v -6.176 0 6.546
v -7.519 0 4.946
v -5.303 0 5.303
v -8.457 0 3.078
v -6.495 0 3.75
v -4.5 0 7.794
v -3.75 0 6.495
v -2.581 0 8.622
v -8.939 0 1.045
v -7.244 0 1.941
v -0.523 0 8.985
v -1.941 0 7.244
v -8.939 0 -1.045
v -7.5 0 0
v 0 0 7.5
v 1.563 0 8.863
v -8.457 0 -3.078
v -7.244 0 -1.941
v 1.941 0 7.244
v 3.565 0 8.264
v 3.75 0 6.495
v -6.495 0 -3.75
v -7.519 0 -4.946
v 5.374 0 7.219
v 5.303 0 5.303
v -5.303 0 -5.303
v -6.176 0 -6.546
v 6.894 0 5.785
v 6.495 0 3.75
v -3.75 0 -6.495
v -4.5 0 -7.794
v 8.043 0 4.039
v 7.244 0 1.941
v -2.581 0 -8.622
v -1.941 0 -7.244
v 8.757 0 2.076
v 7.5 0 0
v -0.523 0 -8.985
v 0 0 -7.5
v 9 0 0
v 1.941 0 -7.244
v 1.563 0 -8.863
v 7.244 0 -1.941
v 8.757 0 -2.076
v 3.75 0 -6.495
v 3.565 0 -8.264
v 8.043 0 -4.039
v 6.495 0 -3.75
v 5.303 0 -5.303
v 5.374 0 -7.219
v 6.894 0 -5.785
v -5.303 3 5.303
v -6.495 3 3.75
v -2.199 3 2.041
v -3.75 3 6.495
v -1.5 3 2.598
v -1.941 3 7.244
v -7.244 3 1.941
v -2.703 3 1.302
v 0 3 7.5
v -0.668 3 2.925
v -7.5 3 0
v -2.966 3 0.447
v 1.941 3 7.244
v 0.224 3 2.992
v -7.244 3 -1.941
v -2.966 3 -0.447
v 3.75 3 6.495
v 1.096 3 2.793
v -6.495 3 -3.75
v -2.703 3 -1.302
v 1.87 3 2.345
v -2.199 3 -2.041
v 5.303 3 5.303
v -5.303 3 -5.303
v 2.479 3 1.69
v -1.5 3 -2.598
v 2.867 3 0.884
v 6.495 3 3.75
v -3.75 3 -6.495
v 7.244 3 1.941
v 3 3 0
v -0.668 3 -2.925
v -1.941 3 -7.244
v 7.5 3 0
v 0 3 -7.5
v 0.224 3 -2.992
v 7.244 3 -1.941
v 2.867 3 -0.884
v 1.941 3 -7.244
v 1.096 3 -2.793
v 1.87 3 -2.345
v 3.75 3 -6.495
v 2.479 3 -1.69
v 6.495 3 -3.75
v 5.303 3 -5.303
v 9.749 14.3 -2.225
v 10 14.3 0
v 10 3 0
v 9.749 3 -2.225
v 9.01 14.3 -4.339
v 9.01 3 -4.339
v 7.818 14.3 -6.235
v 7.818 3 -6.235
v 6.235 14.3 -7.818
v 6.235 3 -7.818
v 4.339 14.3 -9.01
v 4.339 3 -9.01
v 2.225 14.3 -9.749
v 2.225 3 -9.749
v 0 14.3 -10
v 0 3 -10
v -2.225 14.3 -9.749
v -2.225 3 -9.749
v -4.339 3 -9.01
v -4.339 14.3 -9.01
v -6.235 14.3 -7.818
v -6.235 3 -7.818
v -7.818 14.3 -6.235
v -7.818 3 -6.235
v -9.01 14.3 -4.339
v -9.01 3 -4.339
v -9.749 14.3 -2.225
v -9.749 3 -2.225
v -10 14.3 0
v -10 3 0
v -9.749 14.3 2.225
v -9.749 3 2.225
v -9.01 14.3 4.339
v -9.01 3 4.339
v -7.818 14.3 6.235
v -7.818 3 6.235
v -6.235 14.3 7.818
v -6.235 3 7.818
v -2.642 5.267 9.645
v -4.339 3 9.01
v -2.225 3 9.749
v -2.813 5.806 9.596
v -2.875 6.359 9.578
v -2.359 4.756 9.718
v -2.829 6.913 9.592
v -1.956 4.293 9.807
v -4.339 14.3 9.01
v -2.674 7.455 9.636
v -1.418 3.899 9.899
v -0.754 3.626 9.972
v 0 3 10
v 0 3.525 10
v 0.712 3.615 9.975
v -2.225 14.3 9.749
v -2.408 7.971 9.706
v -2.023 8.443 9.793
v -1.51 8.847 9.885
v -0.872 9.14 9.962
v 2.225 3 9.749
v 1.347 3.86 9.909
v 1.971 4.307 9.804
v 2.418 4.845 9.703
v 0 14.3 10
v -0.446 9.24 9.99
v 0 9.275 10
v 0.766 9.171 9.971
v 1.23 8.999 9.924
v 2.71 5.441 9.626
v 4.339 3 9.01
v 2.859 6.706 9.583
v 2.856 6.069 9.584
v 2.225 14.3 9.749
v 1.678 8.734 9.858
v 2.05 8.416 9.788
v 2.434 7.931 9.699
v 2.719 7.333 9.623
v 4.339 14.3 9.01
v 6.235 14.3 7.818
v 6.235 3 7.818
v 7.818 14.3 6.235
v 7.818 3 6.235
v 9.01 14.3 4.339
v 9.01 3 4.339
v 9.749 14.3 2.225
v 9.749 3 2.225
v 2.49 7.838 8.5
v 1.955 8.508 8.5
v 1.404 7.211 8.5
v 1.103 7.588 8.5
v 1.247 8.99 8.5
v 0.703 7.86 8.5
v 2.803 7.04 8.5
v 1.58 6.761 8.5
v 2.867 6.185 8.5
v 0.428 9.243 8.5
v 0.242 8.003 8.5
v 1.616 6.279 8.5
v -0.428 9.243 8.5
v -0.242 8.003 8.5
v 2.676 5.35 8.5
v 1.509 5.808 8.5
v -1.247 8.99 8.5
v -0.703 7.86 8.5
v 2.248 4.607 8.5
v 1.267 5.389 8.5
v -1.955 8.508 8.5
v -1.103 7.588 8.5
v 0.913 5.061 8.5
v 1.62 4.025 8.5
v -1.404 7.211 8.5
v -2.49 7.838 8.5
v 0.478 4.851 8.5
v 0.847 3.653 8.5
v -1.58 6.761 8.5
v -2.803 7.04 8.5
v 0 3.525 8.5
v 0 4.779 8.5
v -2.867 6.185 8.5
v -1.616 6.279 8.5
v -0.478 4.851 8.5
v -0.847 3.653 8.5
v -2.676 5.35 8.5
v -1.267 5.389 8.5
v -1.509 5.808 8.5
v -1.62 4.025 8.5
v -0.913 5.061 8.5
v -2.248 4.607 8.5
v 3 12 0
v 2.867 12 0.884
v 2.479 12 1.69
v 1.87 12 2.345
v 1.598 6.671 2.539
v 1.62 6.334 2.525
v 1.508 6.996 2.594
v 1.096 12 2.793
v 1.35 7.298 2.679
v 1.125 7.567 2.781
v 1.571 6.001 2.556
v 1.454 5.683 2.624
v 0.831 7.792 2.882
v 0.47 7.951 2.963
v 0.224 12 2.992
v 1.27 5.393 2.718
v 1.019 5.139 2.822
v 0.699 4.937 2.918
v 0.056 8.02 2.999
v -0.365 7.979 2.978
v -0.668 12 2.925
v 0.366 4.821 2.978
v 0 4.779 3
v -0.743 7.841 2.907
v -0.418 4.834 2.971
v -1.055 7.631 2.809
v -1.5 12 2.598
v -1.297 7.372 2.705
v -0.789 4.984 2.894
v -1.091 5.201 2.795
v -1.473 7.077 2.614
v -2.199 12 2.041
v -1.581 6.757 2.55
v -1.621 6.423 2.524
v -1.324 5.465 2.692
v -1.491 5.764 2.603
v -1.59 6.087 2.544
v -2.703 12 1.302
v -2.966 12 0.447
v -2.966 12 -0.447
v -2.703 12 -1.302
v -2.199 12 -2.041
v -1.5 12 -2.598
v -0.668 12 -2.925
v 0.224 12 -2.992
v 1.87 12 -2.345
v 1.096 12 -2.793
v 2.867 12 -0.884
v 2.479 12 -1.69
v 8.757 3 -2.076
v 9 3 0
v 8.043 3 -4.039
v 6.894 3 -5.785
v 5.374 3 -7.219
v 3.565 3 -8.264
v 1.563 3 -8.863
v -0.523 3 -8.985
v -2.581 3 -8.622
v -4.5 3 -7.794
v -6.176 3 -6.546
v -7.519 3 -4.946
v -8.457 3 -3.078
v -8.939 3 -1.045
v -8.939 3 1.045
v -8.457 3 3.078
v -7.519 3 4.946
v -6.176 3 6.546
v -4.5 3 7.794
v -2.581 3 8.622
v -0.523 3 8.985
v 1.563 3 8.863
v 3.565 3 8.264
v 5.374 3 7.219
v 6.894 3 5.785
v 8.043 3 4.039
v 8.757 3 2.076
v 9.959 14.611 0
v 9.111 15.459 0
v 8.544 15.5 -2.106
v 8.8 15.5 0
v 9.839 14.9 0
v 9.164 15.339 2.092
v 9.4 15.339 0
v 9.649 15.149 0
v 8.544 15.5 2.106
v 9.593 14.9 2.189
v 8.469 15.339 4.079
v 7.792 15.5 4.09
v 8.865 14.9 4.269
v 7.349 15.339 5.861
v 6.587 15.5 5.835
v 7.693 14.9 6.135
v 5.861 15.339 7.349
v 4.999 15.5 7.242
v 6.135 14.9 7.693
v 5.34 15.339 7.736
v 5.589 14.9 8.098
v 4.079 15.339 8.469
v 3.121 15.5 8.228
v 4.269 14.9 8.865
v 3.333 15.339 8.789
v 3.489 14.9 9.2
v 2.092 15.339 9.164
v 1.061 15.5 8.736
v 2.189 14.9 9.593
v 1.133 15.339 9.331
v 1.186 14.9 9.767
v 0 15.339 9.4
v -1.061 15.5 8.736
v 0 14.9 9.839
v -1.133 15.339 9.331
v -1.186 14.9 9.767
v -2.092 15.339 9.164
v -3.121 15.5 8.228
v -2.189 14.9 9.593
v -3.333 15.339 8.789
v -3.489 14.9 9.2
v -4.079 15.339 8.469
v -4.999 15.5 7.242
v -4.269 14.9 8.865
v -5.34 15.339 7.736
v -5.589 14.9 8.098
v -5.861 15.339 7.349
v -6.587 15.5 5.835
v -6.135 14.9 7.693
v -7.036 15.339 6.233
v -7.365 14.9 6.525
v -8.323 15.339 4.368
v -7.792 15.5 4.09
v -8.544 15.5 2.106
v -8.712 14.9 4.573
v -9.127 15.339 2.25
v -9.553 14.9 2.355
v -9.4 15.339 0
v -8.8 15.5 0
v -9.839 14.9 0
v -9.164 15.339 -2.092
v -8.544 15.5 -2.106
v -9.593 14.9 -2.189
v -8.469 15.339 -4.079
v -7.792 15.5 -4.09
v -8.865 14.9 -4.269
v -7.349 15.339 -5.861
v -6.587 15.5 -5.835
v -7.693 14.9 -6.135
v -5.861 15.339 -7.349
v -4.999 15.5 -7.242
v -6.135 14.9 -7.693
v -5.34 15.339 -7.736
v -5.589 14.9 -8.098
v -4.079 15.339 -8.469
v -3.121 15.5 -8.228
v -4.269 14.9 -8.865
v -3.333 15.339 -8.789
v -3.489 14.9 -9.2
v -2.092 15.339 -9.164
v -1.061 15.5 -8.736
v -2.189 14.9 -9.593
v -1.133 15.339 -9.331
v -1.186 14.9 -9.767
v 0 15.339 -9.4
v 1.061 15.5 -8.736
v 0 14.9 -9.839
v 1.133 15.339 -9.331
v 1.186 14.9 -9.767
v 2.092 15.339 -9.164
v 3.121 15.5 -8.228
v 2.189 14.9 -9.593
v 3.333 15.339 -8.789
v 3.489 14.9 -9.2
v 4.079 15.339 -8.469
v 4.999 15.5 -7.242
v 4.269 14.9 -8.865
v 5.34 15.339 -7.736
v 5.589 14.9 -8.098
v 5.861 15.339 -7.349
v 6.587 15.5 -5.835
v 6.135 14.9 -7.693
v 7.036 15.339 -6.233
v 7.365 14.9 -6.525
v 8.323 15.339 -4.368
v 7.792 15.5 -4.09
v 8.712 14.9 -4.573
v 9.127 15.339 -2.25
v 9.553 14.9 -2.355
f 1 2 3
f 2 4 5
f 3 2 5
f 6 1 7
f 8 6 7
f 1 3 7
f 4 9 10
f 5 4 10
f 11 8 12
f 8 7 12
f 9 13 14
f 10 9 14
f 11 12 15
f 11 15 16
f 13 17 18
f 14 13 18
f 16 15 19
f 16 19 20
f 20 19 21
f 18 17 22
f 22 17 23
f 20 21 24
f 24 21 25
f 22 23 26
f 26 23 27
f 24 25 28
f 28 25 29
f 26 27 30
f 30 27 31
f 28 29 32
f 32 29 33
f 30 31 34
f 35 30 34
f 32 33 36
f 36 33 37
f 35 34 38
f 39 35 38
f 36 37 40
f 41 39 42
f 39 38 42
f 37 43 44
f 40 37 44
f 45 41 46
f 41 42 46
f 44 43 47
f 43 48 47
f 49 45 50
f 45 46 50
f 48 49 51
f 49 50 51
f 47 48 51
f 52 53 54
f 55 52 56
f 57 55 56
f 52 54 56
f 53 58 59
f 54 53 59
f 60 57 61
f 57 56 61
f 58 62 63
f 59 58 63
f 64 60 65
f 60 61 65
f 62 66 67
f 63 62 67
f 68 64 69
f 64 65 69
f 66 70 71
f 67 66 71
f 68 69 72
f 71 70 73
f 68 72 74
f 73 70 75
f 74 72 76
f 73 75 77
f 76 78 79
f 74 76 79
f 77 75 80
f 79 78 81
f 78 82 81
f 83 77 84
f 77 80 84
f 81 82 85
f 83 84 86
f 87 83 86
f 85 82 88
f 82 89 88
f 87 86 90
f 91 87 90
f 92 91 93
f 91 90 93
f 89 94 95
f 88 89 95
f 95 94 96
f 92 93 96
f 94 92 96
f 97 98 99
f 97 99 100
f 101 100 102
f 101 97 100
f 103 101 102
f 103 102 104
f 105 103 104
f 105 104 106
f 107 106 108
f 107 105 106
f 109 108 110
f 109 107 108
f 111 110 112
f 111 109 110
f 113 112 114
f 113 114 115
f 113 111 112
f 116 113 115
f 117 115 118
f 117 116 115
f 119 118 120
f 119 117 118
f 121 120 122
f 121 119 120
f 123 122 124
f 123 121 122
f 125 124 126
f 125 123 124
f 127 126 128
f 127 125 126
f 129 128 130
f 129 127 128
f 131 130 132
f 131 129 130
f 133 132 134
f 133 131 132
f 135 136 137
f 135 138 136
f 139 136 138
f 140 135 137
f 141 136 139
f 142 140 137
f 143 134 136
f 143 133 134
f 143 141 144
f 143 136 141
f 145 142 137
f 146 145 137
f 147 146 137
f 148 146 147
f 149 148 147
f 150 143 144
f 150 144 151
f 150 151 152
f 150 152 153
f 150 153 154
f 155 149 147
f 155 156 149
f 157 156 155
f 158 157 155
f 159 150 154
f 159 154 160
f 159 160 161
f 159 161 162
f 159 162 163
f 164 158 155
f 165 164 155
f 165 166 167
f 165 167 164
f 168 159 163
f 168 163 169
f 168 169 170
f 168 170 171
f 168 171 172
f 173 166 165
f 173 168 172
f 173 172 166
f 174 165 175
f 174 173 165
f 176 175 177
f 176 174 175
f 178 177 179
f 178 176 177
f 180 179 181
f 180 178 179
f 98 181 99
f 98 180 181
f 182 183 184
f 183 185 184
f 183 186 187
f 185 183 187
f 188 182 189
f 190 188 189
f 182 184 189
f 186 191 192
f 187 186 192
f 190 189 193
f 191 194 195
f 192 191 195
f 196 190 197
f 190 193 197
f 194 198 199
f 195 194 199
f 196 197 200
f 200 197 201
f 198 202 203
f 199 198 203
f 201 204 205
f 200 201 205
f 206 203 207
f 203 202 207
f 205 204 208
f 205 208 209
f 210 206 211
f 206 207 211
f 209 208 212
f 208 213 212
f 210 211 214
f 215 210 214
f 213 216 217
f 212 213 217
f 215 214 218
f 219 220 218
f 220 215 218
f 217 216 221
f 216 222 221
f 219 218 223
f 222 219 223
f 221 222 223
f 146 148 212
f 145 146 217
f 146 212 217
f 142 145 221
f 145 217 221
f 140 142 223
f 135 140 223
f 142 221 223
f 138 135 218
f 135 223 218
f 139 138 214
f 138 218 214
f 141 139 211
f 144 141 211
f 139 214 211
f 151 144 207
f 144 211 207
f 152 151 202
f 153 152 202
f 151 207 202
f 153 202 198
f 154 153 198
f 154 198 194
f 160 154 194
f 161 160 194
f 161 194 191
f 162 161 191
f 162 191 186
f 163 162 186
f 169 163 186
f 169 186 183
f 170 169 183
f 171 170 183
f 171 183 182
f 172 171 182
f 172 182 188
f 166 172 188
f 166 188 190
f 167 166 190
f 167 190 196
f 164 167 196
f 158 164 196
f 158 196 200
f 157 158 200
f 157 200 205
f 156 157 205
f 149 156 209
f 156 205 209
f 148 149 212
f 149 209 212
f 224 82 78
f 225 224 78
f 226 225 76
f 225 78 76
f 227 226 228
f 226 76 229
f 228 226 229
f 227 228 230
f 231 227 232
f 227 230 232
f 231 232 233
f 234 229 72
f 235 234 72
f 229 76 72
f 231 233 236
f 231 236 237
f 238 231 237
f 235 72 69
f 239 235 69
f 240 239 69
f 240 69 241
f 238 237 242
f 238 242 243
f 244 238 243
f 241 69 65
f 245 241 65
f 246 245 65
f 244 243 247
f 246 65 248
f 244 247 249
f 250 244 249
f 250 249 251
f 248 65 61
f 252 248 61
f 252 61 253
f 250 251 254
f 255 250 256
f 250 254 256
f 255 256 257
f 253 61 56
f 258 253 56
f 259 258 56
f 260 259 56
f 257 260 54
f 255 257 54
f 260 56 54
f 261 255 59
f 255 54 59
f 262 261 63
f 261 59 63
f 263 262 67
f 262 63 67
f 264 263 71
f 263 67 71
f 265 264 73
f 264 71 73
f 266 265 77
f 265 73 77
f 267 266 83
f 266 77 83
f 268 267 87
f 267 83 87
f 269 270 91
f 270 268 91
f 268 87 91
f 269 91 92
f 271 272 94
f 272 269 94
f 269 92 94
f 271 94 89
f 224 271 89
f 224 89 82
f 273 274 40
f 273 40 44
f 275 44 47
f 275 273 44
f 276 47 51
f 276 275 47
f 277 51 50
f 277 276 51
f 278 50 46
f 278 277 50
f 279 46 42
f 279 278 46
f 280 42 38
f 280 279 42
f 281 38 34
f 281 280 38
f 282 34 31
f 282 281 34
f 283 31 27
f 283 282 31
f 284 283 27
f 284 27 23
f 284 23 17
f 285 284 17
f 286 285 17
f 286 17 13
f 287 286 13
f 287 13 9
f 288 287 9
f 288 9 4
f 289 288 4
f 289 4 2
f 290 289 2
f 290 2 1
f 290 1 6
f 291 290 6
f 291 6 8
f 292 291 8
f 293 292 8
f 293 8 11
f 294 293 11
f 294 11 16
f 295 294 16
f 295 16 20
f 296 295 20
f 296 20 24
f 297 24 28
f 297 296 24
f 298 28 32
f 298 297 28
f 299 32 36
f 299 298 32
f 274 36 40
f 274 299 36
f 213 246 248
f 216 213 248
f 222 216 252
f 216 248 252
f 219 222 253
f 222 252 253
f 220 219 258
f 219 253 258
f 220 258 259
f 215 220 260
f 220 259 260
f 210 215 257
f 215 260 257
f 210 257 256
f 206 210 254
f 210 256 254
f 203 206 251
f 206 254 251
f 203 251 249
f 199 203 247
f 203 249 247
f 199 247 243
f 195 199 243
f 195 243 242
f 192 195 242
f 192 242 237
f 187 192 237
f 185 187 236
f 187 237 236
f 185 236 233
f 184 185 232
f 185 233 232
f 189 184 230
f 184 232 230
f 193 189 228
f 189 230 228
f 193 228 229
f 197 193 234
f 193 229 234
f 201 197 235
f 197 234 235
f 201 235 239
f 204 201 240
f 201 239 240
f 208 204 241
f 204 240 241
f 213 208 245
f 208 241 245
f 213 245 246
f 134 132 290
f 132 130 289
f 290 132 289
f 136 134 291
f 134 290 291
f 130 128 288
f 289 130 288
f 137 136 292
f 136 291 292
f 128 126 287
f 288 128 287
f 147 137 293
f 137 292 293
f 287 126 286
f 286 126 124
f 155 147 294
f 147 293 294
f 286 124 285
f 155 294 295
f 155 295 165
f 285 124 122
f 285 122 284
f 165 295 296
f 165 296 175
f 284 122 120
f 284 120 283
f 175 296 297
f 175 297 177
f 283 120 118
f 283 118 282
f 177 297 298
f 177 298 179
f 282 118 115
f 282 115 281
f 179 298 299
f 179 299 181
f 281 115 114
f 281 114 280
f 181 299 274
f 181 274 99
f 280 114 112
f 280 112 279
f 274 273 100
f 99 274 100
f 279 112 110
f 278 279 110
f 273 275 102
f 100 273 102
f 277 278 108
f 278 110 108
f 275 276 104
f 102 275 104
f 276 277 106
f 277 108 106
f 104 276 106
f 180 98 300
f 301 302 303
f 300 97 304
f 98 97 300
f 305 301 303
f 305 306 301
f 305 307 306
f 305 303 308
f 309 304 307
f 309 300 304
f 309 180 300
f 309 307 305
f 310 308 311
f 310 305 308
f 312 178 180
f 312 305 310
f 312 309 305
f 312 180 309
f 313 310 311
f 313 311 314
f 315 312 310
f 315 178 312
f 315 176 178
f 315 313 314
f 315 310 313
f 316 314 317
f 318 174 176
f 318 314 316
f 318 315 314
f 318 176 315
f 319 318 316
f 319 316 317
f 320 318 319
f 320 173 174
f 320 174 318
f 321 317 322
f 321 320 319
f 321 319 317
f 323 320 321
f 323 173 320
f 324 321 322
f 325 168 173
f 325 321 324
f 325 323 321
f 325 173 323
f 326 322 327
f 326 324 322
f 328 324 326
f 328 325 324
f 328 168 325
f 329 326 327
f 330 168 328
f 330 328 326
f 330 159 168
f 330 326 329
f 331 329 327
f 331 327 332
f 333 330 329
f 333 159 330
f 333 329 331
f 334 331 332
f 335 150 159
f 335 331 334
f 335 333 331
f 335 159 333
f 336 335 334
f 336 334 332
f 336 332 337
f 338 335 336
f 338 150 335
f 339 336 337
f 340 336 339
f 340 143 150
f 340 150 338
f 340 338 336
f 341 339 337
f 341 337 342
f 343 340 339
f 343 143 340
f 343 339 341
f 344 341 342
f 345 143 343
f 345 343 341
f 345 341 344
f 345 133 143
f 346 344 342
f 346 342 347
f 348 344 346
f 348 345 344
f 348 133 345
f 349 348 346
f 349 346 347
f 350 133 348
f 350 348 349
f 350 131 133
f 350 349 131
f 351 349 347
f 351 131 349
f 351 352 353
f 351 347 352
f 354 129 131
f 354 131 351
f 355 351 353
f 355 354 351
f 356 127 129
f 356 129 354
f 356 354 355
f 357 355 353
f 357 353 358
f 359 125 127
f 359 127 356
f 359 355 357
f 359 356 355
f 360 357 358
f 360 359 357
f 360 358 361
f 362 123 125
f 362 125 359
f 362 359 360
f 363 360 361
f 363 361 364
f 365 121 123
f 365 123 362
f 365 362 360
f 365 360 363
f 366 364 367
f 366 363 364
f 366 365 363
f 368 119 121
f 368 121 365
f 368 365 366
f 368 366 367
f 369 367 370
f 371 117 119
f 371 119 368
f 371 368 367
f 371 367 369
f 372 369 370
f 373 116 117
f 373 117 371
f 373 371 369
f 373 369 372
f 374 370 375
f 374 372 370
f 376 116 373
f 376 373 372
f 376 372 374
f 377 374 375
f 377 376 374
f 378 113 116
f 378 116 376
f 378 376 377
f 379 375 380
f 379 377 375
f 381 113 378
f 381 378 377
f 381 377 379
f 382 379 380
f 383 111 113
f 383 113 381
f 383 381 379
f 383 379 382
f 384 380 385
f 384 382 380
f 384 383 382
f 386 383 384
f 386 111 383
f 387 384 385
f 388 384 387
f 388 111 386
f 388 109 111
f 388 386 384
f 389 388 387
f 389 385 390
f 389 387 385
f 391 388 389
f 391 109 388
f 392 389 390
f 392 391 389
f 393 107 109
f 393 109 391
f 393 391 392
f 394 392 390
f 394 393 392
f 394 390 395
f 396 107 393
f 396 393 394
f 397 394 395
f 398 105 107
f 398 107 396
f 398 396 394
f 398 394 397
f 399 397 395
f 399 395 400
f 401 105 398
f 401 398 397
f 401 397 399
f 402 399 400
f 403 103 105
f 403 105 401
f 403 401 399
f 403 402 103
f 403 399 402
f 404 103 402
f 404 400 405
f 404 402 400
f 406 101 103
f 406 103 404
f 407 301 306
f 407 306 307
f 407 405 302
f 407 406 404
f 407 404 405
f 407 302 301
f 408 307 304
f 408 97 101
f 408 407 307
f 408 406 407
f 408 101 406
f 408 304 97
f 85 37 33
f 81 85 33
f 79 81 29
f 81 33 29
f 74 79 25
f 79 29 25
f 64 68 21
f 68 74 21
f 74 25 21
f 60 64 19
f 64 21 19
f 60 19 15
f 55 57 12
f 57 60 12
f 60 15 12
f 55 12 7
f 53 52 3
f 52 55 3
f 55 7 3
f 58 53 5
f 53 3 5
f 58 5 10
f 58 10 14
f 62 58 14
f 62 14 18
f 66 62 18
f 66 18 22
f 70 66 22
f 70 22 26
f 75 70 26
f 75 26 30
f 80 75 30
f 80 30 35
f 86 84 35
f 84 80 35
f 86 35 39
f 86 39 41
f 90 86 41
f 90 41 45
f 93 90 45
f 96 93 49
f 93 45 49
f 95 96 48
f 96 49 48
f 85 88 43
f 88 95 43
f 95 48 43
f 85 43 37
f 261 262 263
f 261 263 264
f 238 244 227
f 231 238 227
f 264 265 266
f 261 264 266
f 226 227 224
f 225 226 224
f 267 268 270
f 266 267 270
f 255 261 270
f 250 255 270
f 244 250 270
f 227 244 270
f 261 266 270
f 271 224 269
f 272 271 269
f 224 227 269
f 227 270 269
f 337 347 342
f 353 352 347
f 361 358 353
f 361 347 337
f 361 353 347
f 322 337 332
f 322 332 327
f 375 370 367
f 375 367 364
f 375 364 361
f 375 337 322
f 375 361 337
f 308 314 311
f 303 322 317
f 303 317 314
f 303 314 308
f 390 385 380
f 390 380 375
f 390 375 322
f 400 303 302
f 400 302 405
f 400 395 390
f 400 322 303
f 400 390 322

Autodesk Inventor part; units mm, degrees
ref_plane "YZ Plane" through (0, 0, 0) normal (1, 0, 0) x (0, 1, 0)
ref_plane "XZ Plane" through (0, 0, 0) normal (0, 1, 0) x (-1, 0, 0)
sketch "Sketch1" plane through (0, 0, 0) normal (0, 0, 1) x (1, 0, 0)
  line L0 (0, -3.1) -> (0, 18.6) construction
  line L1 (-2, 0) -> (12, 0) construction
  line L2 (9, 0) -> (9, 3)
  line L3 (9, 3) -> (10, 3)
  line L4 (10, 3) -> (10, 15.5)
  line L5 (10, 15.5) -> (0, 15.5)
  line L6 (0, 15.5) -> (0, 12)
  line L7 (0, 12) -> (3, 12)
  line L8 (3, 12) -> (3, 3)
  line L9 (3, 3) -> (7.5, 3)
  line L10 (7.5, 3) -> (7.5, 0)
  line L11 (7.5, 0) -> (9, 0)
  point P0 (0, 0)
  point P1 (3, 7.5)
  dimension "d0" = 15.5
  dimension "d1" = 12
  dimension "d2" = 3
  dimension "d4" = 6
  dimension "d5" = 15
  dimension "d6" = 18
  dimension "d7" = 20
revolve "Revolution1" add sketch "Sketch1" angle 360 about axis through (0, -10, 0) along (0, 1, 0)
fillet "Fillet1" radius 1.2 1 edges at (-10, 15.5, 0)
ref_plane "Work Plane1" through (0, 9.25, 10) normal (0, 0, 1) x (1, 0, 0)
sketch "Sketch3" plane through (0, 9.25, 10) normal (0, 0, 1) x (1, 0, 0)
  line L0 (9, -9.25) -> (-9, -9.25) construction
  line L1 (0, -12.35) -> (0, 9.35) construction
  point P0 (0, -9.25)
  point P1 (0, -2.85)
  dimension "d11" = 6.4
hole "Hole1" at (0, 6.4, 10) direction (0, 0, -1) diameter 3.242 end up to surface counterbore diameter 5.75 counterbore depth 1.5 thread size "M4x0.7" class "6H" standard "ISO Metric profile"
properties part number "encoder_cap"
